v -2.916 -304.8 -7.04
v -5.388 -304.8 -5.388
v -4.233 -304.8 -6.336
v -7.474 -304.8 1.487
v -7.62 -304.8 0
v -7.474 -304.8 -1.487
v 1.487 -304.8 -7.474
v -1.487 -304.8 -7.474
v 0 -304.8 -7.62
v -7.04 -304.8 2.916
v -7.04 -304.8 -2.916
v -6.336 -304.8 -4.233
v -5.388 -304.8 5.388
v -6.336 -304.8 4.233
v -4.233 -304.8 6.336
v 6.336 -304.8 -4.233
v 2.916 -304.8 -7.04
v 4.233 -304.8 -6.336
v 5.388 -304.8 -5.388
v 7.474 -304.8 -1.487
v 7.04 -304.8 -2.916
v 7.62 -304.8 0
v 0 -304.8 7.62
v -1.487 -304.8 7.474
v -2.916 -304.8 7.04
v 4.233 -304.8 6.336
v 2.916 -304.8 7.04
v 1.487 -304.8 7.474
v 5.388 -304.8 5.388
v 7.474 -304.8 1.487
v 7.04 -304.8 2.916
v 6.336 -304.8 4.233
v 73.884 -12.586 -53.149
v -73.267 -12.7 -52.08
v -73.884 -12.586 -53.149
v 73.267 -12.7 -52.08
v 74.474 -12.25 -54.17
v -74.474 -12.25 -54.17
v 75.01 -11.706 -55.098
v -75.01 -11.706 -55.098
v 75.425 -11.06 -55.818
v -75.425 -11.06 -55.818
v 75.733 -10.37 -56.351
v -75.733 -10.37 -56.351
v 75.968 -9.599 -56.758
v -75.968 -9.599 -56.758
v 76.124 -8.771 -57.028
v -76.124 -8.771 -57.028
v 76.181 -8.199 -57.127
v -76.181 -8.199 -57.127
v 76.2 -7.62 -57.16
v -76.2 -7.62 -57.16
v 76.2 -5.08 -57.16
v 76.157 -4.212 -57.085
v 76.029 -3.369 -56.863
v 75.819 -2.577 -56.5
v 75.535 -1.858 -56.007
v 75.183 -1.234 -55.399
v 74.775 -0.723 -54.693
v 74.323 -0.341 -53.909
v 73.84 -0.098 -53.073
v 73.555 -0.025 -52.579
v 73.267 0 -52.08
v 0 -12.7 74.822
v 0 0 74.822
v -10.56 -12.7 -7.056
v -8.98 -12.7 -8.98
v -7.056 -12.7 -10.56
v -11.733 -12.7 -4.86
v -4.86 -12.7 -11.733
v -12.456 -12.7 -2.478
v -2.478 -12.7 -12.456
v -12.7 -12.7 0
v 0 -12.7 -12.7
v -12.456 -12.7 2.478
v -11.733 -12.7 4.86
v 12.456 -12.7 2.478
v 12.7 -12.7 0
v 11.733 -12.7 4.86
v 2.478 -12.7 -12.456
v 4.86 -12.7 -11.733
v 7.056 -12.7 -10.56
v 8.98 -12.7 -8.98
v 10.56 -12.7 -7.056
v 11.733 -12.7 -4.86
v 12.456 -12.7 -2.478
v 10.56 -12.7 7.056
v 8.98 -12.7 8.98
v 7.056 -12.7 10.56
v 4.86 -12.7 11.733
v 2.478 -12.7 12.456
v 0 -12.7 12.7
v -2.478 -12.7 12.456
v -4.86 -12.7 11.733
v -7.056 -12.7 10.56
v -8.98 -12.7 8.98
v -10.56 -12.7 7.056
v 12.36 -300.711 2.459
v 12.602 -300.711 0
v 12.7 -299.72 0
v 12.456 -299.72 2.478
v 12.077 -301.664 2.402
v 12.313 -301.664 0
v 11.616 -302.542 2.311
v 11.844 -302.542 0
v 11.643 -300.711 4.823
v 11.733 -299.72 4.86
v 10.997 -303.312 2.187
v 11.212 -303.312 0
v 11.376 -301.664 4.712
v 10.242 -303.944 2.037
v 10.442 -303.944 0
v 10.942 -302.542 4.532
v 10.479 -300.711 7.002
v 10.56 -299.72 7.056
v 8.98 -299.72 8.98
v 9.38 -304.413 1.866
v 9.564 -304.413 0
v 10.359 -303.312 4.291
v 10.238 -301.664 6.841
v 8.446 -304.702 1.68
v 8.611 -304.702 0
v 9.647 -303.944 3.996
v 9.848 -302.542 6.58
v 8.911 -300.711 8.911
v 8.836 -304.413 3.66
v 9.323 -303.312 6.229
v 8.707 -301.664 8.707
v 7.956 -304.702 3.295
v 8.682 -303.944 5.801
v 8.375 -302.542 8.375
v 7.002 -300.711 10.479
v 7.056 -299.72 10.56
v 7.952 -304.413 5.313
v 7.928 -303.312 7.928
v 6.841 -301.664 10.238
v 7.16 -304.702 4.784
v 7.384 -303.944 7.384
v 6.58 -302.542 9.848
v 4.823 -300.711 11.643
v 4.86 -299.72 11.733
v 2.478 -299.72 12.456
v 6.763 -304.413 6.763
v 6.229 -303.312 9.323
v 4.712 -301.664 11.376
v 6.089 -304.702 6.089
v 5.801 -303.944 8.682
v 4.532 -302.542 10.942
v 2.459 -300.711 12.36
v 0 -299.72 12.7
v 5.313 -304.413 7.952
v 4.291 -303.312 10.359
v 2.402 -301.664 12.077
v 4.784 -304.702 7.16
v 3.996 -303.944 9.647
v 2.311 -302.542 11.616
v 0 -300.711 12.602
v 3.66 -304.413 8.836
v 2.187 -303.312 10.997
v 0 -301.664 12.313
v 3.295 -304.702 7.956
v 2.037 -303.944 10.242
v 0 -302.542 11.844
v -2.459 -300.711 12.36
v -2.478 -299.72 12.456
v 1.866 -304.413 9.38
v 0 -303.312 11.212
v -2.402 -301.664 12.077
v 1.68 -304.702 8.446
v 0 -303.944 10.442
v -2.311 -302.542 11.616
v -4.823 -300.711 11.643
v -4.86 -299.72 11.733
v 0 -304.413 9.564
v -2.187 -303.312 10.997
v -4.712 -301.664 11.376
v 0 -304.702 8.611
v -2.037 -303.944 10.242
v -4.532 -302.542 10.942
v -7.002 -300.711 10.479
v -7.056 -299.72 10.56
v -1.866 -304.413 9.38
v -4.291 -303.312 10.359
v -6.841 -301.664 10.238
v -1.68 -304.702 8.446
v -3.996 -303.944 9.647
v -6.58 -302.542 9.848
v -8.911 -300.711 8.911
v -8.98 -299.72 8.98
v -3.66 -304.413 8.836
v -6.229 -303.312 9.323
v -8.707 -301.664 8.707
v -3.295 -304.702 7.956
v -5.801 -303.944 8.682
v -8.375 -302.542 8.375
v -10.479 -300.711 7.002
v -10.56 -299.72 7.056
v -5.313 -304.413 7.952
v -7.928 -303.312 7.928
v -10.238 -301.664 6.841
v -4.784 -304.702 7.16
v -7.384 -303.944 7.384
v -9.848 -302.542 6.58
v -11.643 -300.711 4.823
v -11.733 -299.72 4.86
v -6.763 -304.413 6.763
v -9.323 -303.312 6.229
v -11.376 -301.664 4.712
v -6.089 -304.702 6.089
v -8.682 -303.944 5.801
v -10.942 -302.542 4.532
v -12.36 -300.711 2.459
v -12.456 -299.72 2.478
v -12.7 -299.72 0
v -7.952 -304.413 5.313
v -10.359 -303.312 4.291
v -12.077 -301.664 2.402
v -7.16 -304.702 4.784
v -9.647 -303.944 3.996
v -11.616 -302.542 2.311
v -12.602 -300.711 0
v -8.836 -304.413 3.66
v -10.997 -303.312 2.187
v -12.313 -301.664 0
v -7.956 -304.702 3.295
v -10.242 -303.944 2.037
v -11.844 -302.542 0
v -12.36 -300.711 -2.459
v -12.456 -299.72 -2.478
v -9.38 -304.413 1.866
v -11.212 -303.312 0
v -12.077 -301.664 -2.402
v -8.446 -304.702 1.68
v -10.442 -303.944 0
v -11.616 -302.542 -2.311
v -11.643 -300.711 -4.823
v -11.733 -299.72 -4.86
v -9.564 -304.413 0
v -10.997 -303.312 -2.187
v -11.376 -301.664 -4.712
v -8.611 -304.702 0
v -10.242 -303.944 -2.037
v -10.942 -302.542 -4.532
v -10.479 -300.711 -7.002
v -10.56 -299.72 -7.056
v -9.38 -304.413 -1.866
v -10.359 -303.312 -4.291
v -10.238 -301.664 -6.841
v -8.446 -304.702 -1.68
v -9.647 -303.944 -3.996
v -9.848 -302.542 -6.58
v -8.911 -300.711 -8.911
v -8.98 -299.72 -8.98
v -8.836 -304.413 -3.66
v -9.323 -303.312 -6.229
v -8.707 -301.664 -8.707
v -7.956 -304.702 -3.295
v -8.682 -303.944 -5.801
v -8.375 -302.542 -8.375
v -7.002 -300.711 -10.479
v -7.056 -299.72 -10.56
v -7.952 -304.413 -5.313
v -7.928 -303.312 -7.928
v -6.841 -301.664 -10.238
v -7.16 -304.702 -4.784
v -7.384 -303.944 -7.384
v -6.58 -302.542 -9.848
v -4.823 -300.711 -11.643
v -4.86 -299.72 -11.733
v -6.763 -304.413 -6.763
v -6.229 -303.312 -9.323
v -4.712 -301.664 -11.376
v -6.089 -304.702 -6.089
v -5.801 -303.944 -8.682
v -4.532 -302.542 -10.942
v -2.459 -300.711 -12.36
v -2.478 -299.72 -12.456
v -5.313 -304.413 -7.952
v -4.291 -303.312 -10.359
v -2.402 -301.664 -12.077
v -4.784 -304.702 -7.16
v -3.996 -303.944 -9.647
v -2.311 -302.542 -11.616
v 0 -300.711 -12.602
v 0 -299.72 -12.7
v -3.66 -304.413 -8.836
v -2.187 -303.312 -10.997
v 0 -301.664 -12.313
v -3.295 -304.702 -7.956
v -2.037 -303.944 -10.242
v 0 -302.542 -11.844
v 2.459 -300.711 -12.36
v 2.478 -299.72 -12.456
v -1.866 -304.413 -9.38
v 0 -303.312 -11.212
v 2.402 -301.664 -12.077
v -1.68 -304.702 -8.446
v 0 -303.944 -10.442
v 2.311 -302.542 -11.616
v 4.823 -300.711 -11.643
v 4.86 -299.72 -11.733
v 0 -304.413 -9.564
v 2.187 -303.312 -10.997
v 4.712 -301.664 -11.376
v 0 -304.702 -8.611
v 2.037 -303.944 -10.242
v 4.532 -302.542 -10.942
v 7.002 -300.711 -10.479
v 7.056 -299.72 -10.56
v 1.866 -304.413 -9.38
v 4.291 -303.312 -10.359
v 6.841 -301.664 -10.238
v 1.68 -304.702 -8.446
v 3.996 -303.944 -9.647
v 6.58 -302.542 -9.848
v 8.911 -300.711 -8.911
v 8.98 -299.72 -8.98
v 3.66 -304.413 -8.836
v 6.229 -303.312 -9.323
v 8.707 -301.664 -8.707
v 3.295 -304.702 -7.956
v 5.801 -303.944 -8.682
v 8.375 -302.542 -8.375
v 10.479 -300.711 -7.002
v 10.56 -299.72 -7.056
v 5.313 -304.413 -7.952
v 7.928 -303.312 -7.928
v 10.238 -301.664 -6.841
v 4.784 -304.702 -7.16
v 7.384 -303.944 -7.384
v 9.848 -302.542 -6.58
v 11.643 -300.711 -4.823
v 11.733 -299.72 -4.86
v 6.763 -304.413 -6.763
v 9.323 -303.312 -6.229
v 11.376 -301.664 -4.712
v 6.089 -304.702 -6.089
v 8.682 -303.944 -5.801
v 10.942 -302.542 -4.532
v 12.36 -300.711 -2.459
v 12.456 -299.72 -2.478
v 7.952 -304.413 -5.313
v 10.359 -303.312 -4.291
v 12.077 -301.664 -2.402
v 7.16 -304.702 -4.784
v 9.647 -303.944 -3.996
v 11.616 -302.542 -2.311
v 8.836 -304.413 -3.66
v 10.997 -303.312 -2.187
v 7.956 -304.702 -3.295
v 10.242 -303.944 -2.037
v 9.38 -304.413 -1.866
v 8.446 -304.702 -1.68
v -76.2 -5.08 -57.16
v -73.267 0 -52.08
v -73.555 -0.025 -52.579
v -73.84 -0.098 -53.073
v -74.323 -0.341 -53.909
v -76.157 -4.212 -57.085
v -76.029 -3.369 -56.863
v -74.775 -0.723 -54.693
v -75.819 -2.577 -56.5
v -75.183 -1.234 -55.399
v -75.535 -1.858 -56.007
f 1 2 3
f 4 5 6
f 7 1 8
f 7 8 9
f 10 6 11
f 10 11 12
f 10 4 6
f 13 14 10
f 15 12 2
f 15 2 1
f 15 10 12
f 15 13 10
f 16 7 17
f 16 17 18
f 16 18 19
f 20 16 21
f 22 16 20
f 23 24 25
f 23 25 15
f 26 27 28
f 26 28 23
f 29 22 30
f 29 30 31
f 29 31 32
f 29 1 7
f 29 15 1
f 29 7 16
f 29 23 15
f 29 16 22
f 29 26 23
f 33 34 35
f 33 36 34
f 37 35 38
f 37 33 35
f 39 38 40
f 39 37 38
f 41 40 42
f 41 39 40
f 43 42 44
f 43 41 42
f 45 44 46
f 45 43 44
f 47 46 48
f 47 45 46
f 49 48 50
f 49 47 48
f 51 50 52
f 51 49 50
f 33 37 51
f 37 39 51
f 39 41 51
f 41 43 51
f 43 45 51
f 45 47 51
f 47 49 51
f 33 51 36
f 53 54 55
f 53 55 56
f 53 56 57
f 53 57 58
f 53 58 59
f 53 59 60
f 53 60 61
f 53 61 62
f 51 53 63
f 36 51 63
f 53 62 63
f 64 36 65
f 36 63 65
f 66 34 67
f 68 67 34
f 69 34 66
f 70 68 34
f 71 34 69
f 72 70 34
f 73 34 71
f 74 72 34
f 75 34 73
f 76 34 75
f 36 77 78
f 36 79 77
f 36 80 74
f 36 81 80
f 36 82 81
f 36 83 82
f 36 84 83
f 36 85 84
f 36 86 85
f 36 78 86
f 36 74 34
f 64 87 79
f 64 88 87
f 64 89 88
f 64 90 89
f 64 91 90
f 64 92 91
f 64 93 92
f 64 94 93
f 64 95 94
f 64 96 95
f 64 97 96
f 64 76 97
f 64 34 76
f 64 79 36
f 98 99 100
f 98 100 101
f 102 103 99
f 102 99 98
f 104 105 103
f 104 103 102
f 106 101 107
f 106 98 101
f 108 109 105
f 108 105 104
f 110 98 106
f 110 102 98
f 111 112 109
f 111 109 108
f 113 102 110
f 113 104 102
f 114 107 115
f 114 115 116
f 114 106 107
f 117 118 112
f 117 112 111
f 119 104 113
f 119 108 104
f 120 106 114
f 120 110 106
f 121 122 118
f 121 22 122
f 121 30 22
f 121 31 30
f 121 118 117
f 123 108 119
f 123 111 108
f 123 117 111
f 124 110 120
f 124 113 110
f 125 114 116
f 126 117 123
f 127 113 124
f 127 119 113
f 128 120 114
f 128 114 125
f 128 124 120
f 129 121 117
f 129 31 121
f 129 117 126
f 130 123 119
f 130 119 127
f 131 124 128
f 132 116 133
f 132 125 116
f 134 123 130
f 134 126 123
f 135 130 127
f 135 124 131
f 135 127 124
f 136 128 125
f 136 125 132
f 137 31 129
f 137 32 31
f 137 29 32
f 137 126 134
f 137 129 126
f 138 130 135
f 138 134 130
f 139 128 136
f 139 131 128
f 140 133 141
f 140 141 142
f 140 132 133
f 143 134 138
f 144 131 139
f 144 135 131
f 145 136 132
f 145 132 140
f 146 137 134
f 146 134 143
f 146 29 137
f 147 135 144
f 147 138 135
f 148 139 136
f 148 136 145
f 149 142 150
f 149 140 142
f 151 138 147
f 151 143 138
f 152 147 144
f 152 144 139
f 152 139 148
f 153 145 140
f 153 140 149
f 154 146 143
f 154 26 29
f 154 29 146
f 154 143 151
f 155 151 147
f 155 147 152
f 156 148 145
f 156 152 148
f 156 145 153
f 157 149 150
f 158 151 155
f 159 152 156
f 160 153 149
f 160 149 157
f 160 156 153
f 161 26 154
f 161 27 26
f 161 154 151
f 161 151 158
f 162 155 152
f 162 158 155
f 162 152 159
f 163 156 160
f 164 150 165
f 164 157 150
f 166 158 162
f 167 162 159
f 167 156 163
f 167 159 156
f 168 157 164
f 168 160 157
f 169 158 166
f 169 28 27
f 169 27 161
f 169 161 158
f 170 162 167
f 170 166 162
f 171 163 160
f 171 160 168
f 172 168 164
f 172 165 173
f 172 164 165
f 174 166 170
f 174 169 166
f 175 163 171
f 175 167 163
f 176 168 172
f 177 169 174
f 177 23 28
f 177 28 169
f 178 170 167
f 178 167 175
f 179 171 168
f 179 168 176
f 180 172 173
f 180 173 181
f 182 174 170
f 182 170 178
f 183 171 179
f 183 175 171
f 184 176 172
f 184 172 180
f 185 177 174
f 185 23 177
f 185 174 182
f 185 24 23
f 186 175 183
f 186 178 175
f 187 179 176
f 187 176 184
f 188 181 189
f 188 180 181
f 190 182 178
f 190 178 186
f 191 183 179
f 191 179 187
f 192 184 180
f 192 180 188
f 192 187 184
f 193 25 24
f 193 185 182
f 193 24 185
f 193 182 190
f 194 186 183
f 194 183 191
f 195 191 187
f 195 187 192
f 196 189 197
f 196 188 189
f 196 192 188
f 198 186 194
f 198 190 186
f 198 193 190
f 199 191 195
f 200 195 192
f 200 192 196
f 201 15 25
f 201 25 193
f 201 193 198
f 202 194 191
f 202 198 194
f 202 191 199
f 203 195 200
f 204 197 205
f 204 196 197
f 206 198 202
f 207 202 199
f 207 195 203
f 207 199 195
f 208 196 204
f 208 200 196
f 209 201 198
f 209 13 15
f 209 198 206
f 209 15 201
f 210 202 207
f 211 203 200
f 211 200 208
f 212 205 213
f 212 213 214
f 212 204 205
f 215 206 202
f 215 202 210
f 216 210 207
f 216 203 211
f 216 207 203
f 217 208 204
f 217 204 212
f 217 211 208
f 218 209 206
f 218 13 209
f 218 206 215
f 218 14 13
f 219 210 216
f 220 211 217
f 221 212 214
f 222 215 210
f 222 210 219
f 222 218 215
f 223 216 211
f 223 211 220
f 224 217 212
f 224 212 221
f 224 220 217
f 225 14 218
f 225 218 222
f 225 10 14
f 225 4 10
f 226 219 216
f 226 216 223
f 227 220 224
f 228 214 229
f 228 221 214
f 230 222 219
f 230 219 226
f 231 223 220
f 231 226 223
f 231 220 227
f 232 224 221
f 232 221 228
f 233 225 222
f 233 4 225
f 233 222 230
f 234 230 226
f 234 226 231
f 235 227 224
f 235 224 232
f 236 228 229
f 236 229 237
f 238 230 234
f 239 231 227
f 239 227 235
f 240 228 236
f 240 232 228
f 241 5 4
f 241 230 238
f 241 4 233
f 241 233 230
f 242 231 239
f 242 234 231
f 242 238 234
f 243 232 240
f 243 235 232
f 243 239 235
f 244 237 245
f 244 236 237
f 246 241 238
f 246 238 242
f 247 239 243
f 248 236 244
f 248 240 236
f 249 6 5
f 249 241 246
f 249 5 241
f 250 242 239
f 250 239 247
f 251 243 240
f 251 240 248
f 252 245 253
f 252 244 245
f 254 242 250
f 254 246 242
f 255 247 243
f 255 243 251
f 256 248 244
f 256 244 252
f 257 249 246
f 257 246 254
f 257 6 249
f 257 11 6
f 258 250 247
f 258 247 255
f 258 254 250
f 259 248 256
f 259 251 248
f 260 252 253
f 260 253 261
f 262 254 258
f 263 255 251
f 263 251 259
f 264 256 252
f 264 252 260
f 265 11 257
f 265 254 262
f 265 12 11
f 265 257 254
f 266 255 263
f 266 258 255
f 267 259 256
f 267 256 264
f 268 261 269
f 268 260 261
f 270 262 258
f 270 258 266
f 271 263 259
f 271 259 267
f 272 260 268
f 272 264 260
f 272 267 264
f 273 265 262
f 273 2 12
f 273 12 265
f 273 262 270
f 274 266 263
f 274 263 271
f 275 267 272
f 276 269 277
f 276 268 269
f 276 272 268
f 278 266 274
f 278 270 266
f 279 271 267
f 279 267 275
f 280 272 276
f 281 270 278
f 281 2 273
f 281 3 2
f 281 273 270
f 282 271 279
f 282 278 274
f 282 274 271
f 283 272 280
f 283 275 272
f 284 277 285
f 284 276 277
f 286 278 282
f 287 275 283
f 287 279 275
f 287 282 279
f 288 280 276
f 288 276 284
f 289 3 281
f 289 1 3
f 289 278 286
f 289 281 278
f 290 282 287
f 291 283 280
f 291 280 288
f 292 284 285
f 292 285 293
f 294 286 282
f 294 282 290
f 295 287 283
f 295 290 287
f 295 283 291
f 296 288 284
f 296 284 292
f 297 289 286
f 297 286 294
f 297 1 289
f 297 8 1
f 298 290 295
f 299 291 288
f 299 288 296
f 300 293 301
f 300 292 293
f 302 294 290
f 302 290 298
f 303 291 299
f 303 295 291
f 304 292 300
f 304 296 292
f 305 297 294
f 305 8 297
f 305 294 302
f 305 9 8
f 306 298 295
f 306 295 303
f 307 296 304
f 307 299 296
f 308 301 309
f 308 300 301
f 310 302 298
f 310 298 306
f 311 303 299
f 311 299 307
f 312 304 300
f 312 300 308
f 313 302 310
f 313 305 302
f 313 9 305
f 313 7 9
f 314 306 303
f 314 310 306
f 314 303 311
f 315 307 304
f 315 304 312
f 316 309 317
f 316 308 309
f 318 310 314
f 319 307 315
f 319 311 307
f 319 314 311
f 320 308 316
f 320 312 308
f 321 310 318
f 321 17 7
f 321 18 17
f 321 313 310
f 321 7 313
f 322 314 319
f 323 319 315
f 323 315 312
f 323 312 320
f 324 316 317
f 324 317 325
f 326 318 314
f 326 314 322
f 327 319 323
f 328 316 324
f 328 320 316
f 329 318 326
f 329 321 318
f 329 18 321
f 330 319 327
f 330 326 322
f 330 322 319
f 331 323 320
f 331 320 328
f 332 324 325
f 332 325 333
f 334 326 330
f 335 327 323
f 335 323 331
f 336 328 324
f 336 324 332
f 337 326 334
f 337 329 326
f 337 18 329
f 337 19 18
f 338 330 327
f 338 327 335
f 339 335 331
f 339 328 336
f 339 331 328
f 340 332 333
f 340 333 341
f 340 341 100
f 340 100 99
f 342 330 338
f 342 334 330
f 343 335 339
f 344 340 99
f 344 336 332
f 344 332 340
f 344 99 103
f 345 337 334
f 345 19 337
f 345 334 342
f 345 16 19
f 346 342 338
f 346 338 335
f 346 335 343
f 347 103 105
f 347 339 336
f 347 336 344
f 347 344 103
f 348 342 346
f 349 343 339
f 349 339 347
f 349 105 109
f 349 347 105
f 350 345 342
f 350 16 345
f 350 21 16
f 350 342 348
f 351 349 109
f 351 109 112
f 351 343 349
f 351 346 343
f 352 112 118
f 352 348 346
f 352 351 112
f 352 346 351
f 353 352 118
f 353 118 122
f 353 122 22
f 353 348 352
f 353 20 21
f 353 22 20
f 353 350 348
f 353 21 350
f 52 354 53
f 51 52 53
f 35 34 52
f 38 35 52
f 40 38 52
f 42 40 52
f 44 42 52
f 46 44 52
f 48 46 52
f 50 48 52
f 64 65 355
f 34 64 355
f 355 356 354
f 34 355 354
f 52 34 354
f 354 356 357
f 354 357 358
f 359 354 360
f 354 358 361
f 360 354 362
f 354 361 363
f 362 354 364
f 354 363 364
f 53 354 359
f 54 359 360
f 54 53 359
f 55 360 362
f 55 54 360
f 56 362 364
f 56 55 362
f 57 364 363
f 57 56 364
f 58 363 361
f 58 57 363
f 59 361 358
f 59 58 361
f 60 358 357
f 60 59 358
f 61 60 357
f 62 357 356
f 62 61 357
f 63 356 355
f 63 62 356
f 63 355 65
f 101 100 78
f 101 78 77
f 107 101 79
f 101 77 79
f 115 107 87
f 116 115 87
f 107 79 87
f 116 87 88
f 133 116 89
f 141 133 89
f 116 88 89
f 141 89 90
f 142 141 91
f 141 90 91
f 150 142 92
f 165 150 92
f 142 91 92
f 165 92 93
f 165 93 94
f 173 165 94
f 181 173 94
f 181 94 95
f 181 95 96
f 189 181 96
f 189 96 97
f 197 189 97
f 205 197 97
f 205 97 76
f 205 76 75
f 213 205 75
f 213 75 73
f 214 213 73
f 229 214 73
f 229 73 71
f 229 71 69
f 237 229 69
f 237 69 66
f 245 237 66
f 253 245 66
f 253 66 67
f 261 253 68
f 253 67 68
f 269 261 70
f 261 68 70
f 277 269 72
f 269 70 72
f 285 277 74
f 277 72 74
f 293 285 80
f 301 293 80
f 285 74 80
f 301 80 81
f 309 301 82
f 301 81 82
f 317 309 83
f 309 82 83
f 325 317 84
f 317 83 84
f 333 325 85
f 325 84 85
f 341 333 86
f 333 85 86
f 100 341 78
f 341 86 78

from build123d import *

# Parameters (mm, degrees)
F0_R     = 12.7
F1_DEPTH = 12.7
F2_DEPTH = 304.8
F3_R     = 5.08
F4_R     = 5.08
F5_R     = 5.08


with BuildPart() as f1:
    # F0 (on Front) → F1 (new body)
    with BuildSketch(Plane.XZ):
        Polygon((76.2, -57.15991), (0, 74.822362), (-76.2, -57.15991), align=None)
        Circle(F0_R, mode=Mode.SUBTRACT)
    extrude(amount=F1_DEPTH)

    # F0 (on Front) → F2 (join)
    with BuildSketch(Plane.XZ):
        Circle(F0_R)
    extrude(amount=F2_DEPTH)

    # F3
    f3_edges = [f1.edges().sort_by_distance(p)[0] for p in [
        (-12.7, -304.8, 0),
    ]]
    fillet(f3_edges, radius=F3_R)

    # F4
    f4_edges = [f1.edges().sort_by_distance(p)[0] for p in [
        (0, -12.7, -57.15991),
    ]]
    fillet(f4_edges, radius=F4_R)

    # F5
    f5_edges = [f1.edges().sort_by_distance(p)[0] for p in [
        (0, 0, -57.15991),
    ]]
    fillet(f5_edges, radius=F5_R)


solid = f1.part
